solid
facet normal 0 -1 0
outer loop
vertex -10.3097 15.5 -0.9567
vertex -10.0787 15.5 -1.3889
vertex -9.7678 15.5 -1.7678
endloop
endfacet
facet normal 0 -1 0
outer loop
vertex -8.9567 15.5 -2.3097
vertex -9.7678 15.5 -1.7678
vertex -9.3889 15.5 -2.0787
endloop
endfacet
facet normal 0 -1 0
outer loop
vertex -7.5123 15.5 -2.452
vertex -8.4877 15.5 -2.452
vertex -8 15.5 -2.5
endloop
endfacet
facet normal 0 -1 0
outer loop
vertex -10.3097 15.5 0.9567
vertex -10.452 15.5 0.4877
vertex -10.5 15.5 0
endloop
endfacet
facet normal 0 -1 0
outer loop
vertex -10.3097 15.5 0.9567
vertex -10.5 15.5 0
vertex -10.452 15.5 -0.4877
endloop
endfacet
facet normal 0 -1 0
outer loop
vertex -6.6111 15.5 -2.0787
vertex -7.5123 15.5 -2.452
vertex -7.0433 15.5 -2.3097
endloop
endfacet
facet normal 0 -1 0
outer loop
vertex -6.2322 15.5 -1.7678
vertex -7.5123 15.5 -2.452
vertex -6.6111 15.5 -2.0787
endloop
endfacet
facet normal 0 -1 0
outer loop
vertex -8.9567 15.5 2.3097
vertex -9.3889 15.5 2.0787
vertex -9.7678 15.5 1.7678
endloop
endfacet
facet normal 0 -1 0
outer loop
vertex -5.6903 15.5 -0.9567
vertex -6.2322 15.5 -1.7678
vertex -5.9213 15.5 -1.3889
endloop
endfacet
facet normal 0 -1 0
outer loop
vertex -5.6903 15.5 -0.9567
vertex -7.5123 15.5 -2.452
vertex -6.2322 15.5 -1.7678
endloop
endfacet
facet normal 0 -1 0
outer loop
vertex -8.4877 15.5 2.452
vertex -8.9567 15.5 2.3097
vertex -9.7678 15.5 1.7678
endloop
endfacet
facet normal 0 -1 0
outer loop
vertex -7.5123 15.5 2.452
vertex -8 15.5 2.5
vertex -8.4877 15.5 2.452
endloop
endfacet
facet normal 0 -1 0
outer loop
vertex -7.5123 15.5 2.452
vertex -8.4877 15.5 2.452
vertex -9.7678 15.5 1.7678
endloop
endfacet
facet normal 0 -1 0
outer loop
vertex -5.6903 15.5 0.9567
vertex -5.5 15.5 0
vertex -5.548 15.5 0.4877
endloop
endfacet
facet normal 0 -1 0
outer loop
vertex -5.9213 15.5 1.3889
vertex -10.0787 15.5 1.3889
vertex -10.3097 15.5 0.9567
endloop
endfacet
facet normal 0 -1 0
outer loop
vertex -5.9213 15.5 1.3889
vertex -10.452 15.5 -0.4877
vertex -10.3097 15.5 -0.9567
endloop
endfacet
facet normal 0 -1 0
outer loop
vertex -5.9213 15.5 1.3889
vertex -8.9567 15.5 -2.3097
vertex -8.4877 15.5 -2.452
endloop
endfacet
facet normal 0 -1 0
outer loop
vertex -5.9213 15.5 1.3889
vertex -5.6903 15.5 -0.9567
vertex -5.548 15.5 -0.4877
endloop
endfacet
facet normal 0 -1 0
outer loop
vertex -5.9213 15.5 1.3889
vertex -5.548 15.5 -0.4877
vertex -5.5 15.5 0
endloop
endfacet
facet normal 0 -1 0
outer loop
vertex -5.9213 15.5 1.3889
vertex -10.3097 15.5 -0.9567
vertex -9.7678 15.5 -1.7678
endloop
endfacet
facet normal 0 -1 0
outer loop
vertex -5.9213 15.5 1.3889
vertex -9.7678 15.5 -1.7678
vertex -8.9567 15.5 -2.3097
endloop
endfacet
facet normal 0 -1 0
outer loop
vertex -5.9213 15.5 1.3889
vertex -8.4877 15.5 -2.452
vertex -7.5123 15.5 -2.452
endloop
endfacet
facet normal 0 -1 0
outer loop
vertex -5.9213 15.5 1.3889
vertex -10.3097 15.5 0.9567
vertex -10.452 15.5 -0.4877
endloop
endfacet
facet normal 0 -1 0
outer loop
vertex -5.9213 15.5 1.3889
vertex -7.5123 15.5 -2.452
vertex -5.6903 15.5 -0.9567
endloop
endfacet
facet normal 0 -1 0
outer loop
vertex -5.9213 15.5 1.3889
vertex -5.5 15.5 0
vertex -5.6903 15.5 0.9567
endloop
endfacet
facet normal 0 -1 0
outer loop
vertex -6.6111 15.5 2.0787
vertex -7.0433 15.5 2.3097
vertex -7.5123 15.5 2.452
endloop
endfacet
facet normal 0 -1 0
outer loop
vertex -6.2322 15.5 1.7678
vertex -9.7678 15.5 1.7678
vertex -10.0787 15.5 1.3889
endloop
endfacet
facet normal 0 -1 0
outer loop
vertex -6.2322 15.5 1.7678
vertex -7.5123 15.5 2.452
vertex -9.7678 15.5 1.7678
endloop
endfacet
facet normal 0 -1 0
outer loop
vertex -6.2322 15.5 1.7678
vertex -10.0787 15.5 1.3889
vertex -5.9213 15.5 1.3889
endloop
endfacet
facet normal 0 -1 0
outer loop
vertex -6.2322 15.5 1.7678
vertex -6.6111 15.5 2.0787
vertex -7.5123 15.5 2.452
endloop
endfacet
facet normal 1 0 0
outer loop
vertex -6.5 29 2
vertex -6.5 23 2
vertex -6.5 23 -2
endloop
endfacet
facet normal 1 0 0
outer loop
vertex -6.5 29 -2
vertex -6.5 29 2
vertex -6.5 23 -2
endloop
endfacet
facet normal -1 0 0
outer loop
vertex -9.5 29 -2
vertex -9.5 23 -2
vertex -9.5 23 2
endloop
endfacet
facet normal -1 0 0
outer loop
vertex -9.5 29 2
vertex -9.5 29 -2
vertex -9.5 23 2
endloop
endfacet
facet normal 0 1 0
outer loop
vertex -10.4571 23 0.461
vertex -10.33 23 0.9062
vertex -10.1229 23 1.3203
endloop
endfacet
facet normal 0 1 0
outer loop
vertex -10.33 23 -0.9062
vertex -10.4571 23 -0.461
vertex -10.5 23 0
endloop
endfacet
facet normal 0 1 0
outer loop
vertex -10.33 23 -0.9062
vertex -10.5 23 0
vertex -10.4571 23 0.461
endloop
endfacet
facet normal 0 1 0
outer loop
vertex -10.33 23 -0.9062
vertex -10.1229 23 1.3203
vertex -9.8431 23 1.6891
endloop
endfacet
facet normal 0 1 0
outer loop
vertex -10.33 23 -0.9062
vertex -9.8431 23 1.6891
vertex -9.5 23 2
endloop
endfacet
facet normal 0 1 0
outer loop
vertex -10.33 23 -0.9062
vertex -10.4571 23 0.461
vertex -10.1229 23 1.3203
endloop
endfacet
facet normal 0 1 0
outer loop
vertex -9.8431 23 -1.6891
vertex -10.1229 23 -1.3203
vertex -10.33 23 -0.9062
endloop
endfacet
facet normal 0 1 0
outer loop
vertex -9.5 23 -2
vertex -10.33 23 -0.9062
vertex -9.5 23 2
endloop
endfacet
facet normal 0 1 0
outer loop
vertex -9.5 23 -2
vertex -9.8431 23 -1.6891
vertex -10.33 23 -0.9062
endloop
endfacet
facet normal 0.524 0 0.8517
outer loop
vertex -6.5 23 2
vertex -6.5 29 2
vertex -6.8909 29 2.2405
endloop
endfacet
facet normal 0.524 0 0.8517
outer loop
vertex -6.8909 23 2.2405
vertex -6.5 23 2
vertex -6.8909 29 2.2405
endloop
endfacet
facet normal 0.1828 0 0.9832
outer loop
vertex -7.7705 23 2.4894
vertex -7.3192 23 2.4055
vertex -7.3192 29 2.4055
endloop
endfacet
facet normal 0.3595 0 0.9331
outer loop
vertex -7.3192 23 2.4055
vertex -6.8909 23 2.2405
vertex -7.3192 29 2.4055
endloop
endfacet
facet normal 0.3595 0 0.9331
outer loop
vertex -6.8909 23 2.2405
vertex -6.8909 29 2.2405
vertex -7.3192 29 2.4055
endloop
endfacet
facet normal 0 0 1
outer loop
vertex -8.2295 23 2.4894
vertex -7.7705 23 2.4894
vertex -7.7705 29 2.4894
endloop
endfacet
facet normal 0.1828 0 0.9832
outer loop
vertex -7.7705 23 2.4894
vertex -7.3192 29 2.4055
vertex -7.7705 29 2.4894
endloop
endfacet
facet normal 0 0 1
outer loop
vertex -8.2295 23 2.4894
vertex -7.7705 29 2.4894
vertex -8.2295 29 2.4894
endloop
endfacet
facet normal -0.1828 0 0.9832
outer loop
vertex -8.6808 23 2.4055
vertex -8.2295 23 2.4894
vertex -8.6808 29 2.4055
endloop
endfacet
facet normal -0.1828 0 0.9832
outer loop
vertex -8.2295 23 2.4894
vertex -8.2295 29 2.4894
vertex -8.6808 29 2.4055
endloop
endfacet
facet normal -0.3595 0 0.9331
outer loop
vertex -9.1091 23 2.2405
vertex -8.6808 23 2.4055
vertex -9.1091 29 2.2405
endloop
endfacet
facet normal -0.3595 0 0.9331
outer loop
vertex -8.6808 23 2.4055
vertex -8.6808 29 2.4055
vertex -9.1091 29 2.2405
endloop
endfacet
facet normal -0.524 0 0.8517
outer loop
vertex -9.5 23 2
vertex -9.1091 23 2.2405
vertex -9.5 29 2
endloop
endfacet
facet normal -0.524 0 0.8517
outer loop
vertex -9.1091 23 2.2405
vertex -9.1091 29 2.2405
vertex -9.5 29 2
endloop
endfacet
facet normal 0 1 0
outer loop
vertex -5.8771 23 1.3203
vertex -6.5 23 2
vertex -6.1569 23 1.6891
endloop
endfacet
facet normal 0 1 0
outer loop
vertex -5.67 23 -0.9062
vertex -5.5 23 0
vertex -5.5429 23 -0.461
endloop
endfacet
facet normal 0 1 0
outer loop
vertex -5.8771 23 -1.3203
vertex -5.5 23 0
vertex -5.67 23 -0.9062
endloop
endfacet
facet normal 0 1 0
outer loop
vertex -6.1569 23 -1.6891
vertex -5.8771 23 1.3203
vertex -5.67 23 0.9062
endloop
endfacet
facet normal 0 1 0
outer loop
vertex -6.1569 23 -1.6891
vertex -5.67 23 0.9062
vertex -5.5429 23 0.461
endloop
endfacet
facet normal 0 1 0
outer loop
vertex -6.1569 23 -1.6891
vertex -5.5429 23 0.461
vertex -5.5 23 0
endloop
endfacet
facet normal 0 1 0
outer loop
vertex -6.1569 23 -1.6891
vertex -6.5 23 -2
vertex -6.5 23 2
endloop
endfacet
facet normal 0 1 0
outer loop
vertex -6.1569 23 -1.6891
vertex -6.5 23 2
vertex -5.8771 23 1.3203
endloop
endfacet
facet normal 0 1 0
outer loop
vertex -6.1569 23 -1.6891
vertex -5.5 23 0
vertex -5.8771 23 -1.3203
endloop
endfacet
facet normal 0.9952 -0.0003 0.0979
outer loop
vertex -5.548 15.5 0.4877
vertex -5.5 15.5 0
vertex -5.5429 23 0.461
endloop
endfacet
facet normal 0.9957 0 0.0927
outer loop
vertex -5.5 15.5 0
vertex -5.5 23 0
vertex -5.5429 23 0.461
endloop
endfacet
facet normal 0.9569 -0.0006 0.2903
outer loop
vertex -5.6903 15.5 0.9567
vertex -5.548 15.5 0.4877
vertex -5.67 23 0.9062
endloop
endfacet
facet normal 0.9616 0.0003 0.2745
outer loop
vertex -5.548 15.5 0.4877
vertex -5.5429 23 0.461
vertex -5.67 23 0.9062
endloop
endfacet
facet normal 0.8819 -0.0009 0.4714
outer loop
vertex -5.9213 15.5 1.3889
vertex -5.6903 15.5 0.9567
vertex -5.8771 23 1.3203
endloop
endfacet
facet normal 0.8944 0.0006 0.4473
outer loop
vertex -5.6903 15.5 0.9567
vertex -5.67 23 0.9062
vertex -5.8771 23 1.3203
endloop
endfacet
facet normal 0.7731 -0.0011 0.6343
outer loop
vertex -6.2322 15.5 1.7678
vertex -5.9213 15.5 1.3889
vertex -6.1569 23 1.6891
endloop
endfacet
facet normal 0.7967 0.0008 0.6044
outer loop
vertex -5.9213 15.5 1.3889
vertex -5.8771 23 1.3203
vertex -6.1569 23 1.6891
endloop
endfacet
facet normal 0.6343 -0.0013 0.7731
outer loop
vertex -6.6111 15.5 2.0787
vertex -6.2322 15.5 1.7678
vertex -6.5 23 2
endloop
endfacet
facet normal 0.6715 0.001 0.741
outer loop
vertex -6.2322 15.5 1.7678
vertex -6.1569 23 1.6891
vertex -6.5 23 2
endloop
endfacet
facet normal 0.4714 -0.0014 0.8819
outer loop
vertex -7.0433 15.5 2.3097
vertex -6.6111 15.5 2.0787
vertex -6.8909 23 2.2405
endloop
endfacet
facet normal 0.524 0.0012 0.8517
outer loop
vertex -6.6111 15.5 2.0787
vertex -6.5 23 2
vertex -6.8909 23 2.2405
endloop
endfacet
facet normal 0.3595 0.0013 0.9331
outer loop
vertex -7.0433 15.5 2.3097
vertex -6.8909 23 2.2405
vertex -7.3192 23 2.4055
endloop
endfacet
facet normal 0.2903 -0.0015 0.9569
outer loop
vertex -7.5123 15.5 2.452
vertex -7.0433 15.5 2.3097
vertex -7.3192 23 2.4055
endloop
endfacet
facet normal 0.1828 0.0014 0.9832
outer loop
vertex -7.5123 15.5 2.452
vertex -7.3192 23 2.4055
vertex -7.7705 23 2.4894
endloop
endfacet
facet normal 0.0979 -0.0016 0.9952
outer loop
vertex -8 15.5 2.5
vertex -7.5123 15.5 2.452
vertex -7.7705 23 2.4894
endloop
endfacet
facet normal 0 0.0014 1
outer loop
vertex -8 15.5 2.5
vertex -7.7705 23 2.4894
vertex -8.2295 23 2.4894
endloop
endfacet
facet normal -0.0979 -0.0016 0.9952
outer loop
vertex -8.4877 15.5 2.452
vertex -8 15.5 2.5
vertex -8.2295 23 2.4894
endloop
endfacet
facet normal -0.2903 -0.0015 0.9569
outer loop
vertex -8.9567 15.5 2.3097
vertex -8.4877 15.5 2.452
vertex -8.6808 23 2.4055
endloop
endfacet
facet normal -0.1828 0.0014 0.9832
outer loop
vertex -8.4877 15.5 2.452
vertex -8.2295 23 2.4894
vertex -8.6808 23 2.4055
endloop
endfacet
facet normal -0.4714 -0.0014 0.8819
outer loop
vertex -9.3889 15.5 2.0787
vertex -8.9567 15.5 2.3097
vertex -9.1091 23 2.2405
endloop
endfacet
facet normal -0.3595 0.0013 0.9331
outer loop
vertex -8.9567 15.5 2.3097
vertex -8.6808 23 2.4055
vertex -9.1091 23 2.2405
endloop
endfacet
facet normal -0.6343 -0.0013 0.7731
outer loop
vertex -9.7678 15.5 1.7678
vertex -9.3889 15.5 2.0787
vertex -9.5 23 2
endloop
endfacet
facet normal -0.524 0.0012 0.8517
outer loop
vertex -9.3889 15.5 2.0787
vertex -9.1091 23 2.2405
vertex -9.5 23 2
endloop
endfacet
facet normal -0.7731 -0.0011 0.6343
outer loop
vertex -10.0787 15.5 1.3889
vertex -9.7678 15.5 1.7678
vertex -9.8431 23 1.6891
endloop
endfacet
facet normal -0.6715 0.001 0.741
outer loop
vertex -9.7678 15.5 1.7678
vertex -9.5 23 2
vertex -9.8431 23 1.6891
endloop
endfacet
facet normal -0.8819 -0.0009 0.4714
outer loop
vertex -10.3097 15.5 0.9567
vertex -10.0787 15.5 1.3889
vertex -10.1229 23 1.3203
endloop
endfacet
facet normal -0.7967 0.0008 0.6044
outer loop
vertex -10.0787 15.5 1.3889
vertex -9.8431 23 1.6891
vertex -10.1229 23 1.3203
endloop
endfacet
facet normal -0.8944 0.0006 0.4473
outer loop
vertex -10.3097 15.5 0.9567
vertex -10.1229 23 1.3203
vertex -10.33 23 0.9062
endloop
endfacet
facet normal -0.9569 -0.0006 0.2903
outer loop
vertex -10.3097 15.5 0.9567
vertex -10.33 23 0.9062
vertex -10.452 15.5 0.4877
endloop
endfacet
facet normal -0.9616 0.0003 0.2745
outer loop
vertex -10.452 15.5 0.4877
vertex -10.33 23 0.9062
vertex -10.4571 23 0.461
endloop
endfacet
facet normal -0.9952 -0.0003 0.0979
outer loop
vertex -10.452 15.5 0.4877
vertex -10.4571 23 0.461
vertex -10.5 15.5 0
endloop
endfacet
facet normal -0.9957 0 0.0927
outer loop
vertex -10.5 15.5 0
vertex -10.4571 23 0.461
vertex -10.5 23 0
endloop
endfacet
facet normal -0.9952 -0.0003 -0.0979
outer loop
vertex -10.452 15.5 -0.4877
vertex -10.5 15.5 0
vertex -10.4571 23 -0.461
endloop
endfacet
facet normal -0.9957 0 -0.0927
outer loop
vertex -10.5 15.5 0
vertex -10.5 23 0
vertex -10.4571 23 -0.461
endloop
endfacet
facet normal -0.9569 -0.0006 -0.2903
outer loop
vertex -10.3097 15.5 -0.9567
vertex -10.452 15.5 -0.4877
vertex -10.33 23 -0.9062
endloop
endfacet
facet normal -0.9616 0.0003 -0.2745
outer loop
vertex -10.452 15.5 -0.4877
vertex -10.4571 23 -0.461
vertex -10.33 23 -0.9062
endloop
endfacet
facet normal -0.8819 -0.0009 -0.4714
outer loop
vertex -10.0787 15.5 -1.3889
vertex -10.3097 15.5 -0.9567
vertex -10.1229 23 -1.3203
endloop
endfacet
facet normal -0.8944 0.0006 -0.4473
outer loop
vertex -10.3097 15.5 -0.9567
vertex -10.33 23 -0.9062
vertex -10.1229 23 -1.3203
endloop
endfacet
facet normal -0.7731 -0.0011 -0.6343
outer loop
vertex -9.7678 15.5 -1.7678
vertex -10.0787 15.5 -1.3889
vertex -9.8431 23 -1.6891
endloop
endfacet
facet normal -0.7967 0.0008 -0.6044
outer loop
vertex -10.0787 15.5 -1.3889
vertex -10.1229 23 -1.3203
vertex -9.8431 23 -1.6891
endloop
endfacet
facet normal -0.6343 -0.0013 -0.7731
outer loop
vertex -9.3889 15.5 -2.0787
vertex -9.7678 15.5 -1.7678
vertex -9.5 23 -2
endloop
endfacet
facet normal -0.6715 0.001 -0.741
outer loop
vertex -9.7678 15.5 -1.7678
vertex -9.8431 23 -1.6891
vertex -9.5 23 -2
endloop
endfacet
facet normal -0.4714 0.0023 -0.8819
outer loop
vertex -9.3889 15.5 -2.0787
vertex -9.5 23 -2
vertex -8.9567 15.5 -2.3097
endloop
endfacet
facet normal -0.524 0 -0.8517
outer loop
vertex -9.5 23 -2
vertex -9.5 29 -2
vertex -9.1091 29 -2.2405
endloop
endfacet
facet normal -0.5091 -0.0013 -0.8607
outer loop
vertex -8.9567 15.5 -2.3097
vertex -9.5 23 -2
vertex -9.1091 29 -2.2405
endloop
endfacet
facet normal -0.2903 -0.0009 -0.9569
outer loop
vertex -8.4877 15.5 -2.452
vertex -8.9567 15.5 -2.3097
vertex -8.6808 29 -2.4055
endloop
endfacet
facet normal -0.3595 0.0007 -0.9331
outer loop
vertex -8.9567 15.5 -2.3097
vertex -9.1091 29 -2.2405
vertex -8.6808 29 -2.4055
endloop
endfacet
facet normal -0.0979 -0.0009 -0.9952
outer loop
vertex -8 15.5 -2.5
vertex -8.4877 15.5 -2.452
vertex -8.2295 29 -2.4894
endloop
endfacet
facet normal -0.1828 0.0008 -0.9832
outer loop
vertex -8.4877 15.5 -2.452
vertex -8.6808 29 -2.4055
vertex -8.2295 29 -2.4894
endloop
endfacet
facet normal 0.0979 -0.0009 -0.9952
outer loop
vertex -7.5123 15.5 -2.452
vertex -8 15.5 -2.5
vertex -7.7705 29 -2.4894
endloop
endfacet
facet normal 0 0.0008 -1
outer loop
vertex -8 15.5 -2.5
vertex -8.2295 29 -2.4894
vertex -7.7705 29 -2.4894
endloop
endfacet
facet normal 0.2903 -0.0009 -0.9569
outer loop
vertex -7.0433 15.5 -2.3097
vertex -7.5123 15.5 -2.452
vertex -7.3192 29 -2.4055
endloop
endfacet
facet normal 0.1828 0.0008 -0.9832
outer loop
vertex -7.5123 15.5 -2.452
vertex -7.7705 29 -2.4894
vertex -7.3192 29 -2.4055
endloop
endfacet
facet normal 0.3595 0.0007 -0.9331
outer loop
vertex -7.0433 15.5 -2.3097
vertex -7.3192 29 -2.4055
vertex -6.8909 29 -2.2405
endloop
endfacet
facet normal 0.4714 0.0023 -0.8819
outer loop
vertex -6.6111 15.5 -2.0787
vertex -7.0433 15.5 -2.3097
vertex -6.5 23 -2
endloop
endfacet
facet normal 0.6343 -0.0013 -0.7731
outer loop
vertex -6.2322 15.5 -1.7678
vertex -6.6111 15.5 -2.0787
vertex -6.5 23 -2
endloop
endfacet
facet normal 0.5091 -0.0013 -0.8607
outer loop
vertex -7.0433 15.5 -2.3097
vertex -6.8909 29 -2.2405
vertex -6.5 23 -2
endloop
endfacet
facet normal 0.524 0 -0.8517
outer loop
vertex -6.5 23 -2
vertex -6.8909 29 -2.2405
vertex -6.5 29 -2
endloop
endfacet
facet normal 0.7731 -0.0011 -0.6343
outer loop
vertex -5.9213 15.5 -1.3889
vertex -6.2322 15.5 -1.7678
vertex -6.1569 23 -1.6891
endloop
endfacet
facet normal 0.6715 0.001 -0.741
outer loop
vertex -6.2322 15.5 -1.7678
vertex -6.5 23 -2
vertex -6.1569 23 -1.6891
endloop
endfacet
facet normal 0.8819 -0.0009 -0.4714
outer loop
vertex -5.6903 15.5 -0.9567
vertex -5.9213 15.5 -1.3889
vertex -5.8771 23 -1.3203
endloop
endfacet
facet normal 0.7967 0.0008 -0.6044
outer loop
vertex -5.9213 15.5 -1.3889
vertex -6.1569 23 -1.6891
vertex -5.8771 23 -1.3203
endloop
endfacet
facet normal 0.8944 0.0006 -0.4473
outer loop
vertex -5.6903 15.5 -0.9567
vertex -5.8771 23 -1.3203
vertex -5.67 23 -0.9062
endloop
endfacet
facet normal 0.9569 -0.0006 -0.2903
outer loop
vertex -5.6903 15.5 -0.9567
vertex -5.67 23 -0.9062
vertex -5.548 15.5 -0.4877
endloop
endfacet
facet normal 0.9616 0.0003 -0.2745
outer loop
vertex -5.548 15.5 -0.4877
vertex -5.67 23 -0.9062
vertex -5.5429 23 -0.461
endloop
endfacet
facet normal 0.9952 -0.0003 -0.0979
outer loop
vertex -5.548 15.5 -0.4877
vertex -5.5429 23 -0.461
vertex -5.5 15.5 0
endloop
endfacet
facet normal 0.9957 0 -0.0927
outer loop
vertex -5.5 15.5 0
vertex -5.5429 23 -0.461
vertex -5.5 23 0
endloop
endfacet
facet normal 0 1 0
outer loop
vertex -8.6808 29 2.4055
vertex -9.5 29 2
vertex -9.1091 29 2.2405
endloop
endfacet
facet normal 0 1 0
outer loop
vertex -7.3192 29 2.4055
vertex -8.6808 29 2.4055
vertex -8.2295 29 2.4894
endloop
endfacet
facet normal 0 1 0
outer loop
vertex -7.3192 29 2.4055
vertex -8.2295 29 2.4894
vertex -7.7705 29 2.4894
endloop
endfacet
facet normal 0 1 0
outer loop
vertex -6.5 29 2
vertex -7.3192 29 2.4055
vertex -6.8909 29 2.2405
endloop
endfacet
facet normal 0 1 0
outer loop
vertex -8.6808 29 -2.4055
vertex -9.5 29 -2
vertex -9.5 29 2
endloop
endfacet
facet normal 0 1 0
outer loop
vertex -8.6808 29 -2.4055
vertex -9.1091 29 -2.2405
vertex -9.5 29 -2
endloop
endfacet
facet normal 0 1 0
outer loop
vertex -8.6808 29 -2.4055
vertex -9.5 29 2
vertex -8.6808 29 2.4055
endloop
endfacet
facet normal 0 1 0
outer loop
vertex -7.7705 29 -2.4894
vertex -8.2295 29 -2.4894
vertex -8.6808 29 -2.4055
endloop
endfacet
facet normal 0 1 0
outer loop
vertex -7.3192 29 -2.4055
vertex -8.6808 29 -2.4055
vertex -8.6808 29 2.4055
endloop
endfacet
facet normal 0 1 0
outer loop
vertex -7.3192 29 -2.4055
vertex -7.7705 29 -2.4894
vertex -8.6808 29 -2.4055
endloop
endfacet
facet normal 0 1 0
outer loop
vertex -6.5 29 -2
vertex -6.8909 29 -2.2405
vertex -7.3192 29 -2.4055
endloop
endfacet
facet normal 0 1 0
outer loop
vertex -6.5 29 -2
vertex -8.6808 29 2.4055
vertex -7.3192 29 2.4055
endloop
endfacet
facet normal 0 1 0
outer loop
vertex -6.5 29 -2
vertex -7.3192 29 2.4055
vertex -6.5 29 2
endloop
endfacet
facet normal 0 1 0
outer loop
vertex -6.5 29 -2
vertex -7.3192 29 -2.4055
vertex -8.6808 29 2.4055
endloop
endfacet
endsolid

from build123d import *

# Parameters (mm, degrees)
CROQUIS1_R              = 14
CROQUIS1_W              = 14.155779923
CROQUIS1_H              = 14.6
SALIENTE_EXTRUIR1_DEPTH = 19
CROQUIS2_R              = 4.5
SALIENTE_EXTRUIR2_DEPTH = 1.5
CROQUIS3_R              = 2.5
SALIENTE_EXTRUIR3_DEPTH = 2.5
SALIENTE_EXTRUIR4_DEPTH = 6
CROQUIS5_W              = 18.5
CROQUIS5_H              = 1.5
CORTAR_EXTRUIR3_DEPTH   = 50
CROQUIS6_R              = 2.5
SALIENTE_EXTRUIR5_DEPTH = 5


with BuildPart() as part:
    # Croquis1 → Saliente-Extruir1 (new body)
    with BuildSketch(Plane(origin=(0, 0, 0), x_dir=(1, 0, 0), z_dir=(0, 1, 0))):
        Circle(CROQUIS1_R)
        with Locations((9.922110038, 0)):
            Rectangle(CROQUIS1_W, CROQUIS1_H)
    extrude(amount=SALIENTE_EXTRUIR1_DEPTH)

    # Croquis2 → Saliente-Extruir2 (add)
    with BuildSketch(Plane(origin=(0, 19, 0), x_dir=(1, 0, 0), z_dir=(0, 1, 0))):
        with Locations((-8, 0)):
            Circle(CROQUIS2_R)
    extrude(amount=SALIENTE_EXTRUIR2_DEPTH)

    # Croquis3 → Saliente-Extruir3 (add)
    with BuildSketch(Plane(origin=(0, 20.5, 0), x_dir=(1, 0, 0), z_dir=(0, 1, 0))):
        with Locations((-8, 0)):
            Circle(CROQUIS3_R)
    extrude(amount=SALIENTE_EXTRUIR3_DEPTH)

    # Croquis4 → Saliente-Extruir4 (add)
    with BuildSketch(Plane(origin=(0, 23, 0), x_dir=(1, 0, 0), z_dir=(0, 1, 0))):
        with BuildLine():
            Line((-9.5, 2), (-9.5, -2))
            ThreePointArc((-9.5, -2), (-8, -2.5), (-6.5, -2))
            Line((-6.5, -2), (-6.5, 2))
            ThreePointArc((-6.5, 2), (-8, 2.5), (-9.5, 2))
        make_face()
    extrude(amount=SALIENTE_EXTRUIR4_DEPTH)

    # Croquis5 → Cortar-Extruir3 (cut)
    with BuildSketch(Plane(origin=(17, 0, 0), x_dir=(0, 0, -1), z_dir=(1, 0, 0))):
        with Locations((-4.75, 19.75)):
            Rectangle(CROQUIS5_W, CROQUIS5_H)
        Polygon((4.5, 19), (-14, 19), (-14, 0), (14, 0), (14, 19), align=None)
    extrude(amount=-CORTAR_EXTRUIR3_DEPTH, mode=Mode.SUBTRACT)

    # Croquis6 → Saliente-Extruir5 (add)
    with BuildSketch(Plane.XZ.offset(-20.5)):
        with Locations((-8, 0)):
            Circle(CROQUIS6_R)
    extrude(amount=SALIENTE_EXTRUIR5_DEPTH)


solid = part.part
